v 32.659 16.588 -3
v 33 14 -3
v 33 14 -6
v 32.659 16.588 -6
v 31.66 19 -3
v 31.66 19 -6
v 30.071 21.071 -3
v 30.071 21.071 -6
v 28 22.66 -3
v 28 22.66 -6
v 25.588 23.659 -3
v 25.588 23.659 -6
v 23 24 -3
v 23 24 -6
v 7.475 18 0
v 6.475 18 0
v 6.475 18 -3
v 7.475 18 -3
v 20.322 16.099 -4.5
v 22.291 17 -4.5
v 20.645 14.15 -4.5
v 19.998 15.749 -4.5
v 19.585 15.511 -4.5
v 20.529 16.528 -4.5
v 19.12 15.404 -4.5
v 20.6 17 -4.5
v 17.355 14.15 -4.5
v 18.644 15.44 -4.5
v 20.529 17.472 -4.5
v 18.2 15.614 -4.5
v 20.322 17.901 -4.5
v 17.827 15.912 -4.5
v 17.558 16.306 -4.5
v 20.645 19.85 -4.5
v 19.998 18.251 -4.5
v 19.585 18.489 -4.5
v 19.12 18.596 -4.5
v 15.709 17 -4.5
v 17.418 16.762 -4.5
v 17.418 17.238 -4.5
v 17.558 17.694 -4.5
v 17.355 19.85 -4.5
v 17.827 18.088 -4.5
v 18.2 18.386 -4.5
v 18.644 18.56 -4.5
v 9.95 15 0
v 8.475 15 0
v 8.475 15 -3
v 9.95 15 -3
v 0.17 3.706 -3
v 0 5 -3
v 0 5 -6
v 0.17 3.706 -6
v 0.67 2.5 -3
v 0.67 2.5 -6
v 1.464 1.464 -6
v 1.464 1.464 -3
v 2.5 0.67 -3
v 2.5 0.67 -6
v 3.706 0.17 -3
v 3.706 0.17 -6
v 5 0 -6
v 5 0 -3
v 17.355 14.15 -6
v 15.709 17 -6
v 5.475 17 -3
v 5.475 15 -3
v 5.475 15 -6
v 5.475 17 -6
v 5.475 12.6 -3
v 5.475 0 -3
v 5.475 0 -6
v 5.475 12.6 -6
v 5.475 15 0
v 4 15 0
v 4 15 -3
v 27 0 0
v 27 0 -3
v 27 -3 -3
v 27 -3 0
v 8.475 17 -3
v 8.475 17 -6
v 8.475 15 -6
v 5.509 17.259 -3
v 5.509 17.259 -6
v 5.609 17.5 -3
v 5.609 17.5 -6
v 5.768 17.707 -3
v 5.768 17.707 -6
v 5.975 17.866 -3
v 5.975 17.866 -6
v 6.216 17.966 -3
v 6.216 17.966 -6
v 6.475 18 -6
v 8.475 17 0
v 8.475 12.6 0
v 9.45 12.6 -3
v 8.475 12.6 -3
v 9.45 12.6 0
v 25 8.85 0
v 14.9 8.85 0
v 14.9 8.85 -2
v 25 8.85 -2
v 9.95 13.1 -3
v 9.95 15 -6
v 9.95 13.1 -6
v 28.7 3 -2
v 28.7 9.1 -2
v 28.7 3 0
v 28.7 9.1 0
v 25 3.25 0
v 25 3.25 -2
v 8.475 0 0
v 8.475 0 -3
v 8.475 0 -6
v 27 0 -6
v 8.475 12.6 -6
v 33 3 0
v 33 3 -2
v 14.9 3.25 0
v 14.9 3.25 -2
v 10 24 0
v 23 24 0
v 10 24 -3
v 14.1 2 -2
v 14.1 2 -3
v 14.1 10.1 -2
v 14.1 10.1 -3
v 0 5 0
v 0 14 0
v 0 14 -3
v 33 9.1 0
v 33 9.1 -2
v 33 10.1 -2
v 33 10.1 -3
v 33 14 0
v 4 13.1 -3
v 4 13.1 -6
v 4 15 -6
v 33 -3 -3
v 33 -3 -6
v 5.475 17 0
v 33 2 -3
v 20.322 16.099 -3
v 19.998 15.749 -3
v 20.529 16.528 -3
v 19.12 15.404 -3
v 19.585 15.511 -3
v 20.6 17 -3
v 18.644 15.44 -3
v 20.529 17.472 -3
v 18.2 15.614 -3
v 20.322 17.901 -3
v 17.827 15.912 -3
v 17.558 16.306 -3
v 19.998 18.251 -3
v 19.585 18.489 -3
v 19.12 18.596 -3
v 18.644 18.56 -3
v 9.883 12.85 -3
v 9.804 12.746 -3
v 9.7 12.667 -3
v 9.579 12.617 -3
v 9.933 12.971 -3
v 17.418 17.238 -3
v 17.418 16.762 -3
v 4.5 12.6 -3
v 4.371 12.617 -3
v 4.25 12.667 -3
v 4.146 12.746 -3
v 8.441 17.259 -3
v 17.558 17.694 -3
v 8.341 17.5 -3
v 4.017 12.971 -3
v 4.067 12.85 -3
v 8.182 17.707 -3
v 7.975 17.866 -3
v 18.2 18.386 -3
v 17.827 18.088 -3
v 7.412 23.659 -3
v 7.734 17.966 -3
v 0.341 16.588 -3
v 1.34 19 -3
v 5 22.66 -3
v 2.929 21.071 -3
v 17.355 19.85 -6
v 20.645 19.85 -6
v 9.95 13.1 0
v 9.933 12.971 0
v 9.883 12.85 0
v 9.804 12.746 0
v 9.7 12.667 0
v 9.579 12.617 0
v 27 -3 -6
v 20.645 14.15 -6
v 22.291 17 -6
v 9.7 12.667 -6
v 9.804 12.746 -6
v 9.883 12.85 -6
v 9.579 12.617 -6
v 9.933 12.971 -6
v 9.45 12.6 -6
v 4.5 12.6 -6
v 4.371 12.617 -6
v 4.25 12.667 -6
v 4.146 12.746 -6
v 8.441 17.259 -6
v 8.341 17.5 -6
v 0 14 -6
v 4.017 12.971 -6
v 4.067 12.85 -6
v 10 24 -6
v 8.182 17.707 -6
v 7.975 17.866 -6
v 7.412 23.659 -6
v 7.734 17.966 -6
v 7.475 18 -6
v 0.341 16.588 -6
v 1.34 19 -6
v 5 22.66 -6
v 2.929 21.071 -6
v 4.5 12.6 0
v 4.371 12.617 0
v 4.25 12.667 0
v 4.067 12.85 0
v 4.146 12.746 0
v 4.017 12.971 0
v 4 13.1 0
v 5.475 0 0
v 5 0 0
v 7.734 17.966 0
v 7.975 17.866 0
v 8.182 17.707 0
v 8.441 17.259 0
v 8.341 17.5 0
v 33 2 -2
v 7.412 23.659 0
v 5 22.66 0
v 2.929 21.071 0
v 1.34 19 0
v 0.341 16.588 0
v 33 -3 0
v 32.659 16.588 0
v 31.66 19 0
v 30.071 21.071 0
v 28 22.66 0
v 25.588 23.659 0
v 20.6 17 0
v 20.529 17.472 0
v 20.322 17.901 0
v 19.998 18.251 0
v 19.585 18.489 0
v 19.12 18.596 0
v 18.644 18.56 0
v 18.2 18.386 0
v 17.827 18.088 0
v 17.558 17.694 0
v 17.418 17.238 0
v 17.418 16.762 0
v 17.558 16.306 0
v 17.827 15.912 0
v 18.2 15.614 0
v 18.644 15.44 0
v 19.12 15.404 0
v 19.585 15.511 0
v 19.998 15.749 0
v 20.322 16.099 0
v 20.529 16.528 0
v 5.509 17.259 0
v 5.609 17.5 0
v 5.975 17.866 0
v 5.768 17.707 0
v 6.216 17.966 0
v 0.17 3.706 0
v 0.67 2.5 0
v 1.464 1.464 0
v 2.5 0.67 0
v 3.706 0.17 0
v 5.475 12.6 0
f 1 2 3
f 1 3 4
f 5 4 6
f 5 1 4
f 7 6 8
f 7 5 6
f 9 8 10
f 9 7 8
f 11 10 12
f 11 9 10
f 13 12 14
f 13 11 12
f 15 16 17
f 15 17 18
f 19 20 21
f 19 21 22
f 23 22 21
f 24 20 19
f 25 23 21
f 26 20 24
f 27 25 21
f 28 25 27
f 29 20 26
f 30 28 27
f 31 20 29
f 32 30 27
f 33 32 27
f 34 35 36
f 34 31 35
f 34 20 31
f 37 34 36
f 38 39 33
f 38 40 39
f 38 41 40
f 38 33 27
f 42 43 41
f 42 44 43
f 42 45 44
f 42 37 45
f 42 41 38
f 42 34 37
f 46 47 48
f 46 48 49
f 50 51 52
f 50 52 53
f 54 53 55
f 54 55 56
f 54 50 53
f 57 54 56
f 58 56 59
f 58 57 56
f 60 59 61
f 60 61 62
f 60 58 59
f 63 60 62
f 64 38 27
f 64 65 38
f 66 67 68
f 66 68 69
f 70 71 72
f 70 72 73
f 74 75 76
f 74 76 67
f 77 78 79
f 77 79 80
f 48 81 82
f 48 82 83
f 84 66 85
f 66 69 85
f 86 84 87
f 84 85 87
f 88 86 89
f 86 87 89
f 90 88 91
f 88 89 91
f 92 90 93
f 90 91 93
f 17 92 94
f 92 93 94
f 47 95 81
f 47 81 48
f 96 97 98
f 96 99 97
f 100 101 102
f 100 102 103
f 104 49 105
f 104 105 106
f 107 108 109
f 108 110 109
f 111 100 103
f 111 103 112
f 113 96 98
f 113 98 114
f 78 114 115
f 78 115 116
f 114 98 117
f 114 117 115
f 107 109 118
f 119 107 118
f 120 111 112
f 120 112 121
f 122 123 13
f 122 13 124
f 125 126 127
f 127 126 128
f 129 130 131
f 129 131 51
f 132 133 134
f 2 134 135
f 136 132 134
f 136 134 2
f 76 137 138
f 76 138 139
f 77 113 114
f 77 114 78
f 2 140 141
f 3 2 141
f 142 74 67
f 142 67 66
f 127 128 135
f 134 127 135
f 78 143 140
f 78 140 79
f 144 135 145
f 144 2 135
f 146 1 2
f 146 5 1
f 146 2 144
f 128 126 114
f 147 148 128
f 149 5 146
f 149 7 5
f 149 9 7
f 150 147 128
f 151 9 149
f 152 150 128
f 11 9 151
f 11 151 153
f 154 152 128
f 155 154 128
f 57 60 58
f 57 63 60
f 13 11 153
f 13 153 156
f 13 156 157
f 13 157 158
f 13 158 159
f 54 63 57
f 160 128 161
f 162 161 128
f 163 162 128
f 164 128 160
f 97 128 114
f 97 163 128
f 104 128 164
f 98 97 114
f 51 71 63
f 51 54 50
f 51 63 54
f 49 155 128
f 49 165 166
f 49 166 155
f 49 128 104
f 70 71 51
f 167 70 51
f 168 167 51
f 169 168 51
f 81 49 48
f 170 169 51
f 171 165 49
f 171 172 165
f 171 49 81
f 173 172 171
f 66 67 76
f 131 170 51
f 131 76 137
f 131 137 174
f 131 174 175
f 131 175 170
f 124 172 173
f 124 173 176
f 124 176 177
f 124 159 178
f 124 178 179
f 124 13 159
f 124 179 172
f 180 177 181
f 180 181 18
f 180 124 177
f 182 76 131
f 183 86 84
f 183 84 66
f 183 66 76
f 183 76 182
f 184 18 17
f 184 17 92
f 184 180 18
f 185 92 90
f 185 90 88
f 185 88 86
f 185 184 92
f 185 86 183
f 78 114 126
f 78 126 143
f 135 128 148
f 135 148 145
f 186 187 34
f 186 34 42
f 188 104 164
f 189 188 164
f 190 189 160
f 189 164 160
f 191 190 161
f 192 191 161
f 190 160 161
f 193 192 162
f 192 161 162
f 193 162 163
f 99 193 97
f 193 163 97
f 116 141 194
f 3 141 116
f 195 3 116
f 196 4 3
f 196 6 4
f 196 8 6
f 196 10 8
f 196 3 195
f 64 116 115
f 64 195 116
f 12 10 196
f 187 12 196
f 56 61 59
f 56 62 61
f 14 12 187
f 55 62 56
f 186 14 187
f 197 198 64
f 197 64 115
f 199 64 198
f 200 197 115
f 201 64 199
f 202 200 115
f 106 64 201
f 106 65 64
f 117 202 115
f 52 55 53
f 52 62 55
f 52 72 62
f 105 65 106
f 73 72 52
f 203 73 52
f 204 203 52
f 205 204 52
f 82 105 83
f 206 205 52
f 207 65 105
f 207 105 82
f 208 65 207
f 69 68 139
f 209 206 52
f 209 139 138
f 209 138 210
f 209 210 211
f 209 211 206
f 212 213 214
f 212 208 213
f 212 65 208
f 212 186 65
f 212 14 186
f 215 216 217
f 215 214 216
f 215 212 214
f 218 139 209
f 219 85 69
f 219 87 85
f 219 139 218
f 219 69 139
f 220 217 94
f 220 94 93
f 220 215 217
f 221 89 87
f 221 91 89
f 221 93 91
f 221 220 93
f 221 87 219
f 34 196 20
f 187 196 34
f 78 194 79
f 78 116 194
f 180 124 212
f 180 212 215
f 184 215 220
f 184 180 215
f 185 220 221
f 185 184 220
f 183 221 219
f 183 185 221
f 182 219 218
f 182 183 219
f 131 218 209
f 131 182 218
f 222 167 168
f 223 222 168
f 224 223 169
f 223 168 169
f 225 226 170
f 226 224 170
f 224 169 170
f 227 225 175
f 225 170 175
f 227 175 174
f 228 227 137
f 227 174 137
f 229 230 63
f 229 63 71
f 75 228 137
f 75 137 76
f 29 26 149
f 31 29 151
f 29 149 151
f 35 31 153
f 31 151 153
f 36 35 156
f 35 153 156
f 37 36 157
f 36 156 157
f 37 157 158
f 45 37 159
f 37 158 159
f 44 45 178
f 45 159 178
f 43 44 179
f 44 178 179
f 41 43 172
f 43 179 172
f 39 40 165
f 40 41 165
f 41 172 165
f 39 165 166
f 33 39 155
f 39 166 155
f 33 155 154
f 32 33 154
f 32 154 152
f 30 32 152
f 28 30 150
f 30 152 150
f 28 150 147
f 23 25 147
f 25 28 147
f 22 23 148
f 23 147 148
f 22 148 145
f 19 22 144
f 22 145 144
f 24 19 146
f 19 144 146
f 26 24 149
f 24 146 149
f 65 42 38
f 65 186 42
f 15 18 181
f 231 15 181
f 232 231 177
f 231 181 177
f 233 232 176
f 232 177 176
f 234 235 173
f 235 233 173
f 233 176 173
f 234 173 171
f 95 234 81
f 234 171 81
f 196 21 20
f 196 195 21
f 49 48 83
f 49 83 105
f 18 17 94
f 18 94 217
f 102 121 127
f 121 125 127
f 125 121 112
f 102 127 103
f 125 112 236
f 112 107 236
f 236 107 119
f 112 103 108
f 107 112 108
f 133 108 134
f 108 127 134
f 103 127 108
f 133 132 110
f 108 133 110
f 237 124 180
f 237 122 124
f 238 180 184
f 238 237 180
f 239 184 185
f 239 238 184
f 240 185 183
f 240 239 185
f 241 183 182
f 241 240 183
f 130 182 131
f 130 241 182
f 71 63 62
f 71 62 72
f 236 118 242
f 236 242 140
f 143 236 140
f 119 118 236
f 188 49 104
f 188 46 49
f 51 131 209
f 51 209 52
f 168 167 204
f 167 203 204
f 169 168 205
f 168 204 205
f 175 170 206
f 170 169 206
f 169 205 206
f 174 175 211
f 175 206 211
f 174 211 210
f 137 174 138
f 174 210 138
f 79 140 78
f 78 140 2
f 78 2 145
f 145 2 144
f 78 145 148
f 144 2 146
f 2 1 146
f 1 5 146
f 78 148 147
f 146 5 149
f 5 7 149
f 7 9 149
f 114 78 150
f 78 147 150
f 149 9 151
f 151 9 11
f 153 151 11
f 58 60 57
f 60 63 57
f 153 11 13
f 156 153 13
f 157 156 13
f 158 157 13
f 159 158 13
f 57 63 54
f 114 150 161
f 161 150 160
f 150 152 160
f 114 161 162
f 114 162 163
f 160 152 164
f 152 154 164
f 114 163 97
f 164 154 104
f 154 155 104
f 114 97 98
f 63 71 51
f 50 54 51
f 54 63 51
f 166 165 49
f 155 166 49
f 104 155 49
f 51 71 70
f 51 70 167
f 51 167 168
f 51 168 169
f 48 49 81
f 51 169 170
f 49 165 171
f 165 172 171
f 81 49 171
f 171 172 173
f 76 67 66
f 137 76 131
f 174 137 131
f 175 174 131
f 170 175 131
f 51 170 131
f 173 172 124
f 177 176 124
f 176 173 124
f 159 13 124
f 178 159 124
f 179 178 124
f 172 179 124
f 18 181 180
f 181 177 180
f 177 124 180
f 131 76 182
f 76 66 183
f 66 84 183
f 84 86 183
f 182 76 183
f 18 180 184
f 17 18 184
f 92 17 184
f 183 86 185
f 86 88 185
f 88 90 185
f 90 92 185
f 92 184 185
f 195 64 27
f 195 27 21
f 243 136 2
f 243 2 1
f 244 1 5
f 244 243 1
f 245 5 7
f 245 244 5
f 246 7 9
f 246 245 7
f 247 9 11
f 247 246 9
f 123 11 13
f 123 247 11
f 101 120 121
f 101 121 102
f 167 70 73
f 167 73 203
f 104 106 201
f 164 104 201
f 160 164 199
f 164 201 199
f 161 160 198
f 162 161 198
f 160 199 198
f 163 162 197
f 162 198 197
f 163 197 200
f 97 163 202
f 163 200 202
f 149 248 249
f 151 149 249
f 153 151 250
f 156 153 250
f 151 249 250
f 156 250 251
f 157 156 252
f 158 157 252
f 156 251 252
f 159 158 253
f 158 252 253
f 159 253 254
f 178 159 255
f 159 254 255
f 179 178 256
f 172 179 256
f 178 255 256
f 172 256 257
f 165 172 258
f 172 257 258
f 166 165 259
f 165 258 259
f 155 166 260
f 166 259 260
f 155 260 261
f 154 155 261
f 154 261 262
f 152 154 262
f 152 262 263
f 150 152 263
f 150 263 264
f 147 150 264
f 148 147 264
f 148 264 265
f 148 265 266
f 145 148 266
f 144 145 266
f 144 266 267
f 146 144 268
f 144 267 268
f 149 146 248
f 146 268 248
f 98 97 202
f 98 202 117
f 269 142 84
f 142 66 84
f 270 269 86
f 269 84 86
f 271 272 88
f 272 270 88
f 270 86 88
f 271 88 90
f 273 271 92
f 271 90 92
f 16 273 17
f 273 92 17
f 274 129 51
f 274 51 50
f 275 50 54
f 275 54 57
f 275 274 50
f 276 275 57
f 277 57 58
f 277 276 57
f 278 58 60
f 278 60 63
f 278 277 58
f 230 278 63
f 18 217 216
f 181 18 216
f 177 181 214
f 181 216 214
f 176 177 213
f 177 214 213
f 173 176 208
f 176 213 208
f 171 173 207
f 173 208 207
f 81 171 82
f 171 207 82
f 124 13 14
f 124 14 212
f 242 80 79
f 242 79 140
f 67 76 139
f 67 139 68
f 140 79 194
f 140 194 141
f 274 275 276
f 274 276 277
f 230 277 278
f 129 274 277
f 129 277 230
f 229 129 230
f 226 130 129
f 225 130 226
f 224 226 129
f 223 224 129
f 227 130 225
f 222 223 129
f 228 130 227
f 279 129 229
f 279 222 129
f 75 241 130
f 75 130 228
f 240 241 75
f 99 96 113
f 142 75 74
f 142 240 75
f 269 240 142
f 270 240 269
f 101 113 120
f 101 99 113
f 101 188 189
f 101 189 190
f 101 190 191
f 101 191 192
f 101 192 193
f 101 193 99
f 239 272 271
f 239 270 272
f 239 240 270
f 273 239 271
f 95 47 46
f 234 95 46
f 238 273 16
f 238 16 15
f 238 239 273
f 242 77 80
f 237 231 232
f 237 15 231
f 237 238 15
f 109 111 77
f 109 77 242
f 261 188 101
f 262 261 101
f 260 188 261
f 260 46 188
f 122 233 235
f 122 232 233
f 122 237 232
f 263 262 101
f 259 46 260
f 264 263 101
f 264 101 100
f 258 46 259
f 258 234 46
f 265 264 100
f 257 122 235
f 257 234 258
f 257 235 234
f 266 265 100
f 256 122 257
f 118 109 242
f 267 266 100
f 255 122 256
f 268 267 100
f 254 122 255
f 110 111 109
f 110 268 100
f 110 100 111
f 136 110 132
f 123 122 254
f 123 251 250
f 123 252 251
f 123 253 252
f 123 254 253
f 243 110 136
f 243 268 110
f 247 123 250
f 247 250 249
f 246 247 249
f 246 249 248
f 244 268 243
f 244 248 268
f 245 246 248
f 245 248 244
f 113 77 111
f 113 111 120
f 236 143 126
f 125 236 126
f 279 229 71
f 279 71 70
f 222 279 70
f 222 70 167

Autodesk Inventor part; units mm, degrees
ref_plane "YZ Plane" through (0, 0, 0) normal (1, 0, 0) x (0, 1, 0)
ref_plane "XZ Plane" through (0, 0, 0) normal (0, 1, 0) x (-1, 0, 0)
ref_plane "XY Plane" through (0, 0, 0) normal (0, 0, 1) x (1, 0, 0)
sketch "Sketch1" plane through (0, 0, 0) normal (0, 0, 1) x (1, 0, 0)
  line L0 (5, 0) -> (5.475, 0)
  line L1 (33, 0) -> (33, 14)
  line L2 (23, 24) -> (10, 24)
  line L3 (0, 14) -> (0, 5)
  line L4 (5.475, 0) -> (5.475, 12.6)
  line L5 (5.475, 12.6) -> (4, 12.6)
  line L6 (4, 12.6) -> (4, 15)
  line L7 (4, 15) -> (5.475, 15)
  line L8 (5.475, 15) -> (5.475, 18)
  line L9 (5.475, 18) -> (8.475, 18)
  line L10 (8.475, 18) -> (8.475, 15)
  line L11 (8.475, 15) -> (9.95, 15)
  line L12 (9.95, 15) -> (9.95, 12.6)
  line L13 (9.95, 12.6) -> (8.475, 12.6)
  line L14 (8.475, 12.6) -> (8.475, 0)
  circle A0 centre (19, 17) radius 1.6
  line L15 (5.475, 0) -> (8.475, 0) construction
  line L16 (8.475, 0) -> (33, 0)
  line L17 (33, 2) -> (14.1, 2)
  line L18 (14.1, 2) -> (14.1, 6.05)
  line L19 (14.1, 10.1) -> (33, 10.1)
  line L20 (33, 10.1) -> (33, 2)
  line L21 (33, 9.1) -> (28.7, 9.1)
  line L22 (28.7, 9.1) -> (28.7, 6.05)
  line L23 (28.7, 3) -> (33, 3)
  line L24 (33, 3) -> (33, 9.1)
  line L25 (14.9, 8.85) -> (25, 8.85)
  line L26 (25, 8.85) -> (25, 3.25)
  line L27 (25, 3.25) -> (14.9, 3.25)
  line L28 (14.9, 3.25) -> (14.9, 6.05)
  line L29 (14.1, 6.05) -> (33, 6.05) construction
  line L30 (14.9, 6.05) -> (14.9, 8.85)
  line L31 (28.7, 6.05) -> (28.7, 3)
  line L32 (14.1, 6.05) -> (14.1, 10.1)
  arc A1 (10, 24) -> (0, 14) centre (10, 14) ccw
  arc A2 (33, 14) -> (23, 24) centre (23, 14) ccw
  arc A3 (0, 5) -> (5, 0) centre (5, 5) ccw
  point P0 (0, 0)
  point P1 (33, 24)
  point P2 (0, 24)
  dimension "totalWidth" = 33
  dimension "totalHeight" = 24
  dimension "edgeToNut" = 4
  dimension "boltHoleWidth" = 3
  dimension "nutSlotEndOffset" = 3
  dimension "boltHoleLength" = 18
  dimension "nutSlotDepth" = 2.4
  dimension "nutSlotWidth" = 5.95
  dimension "boltVertOffset" = 7
  dimension "boltDiameter" = 3.2
  dimension "boltHorizOffset" = 14
  dimension "IRSensorLength" = 18.9
  dimension "IRSensorHeight" = 8.1
  dimension "IRSensorVertOffset" = 2
  dimension "IRModuleHeight" = 5.6
  dimension "IRModuleLength" = 10.1
  dimension "moduleConnectorGap" = 3.7
  dimension "connectorHeight" = 6.1
  dimension "connectorWidth" = 4.3
  dimension "topFillet" = 10
  dimension "d20" = 10
  dimension "d21" = 5
extrude "Extrusion1" add sketch "Sketch1" against normal blind 3 contours A3 L3 A1 L2 A2 L1 L19 L32 L18 L17 L16 L14 L13 L12 L11 L10 L9 L8 L7 L6 L5 L4 L0 | L1 L21 L22 L31 L23 L17 L18 L32 L19
fillet "Fillet1" radius 1 2 edges at (5.475, 18, -1.5) (8.475, 18, -1.5)
fillet "Fillet2" radius 0.5 2 edges at (4, 12.6, -1.5) (9.95, 12.6, -1.5)
extrude "Extrusion2" add sketch "Sketch1" against normal blind 3 from surface at -3 separate body contours A3 L3 A1 L2 A2 L1 L19 L32 L18 L17 L16 L14 L13 L12 L11 L10 L9 L8 L7 L6 L5 L4 L0 | L1 L21 L22 L31 L23 L17 L18 L32 L19 | L1 L23 L31 L22 L21 | L25 L26 L27 L28 L30
sketch "Sketch2" plane through (33, 0, -6) normal (0, 0, -1) x (-1, 0, 0)
  circle A0 centre (14, 17) radius 1.6 projected
  line L0 (15.6454, 19.85) -> (17.2909, 17)
  line L1 (17.2909, 17) -> (15.6454, 14.15)
  line L2 (15.6454, 14.15) -> (12.3546, 14.15)
  line L3 (12.3546, 14.15) -> (10.7091, 17)
  line L4 (10.7091, 17) -> (12.3546, 19.85)
  line L5 (12.3546, 19.85) -> (15.6454, 19.85)
  line L6 (23, 24) -> (10, 24) projected
  point P0 (33, 0)
  dimension "nutSlotDiameter" = 5.7
extrude "Extrusion3" cut sketch "Sketch2" against normal blind 1.5 bodies 2
sketch "Sketch3" plane through (8.475, 0, 0) normal (0, -1, 0) x (1, 0, 0)
  line L0 (24.525, -6) -> (0, -6) projected
  line L1 (24.525, -6) -> (18.525, -6)
  line L2 (18.525, -6) -> (18.525, 0)
  line L3 (18.525, 0) -> (24.525, 0)
  line L4 (24.525, 0) -> (24.525, -6)
  line L5 (24.525, -6) -> (24.525, -3) projected
  line L6 (24.525, -3) -> (18.525, -3)
  line L7 (24.525, -3) -> (0, -3) projected
  point P0 (-8.475, 0)
  dimension "d31" = 6
  dimension "d32" = 6
extrude "Extrusion4" add sketch "Sketch3" along normal blind 3 contours L6 L2 L3 L4 bodies 1
extrude "Extrusion5" add sketch "Sketch3" along normal blind 3 contours L0 L2 L6 L4 bodies 2
sketch "Sketch4" plane through (10, 24, -3) normal (0, 0, 1) x (1, 0, 0)
  line L0 (4.1, -13.9) -> (23, -13.9) projected
  line L1 (23, -13.9) -> (23, -22) projected
  line L2 (23, -22) -> (4.1, -22) projected
  line L3 (4.1, -22) -> (4.1, -17.95) projected
  line L4 (4.1, -17.95) -> (4.1, -13.9) projected
  point P0 (-10, -24)
extrude "Extrusion6" cut sketch "Sketch4" along normal blind 1 bodies 1
fillet "Fillet3" radius 1 2 edges at (5.475, 18, -4.5) (8.475, 18, -4.5)
fillet "Fillet4" radius 0.5 2 edges at (9.95, 12.6, -4.5) (4, 12.6, -4.5)
equation "\"d20\" = topFillet"
equation "\"d21\" = 0.5 * topFillet"
equation "\"d29\" = 0.5 * perspexThickness"
equation "\"d31\" = 2 * perspexThickness"
equation "\"d32\" = 2 * perspexThickness"
equation "\"d33\" = perspexThickness"
equation "\"d35\" = perspexThickness"
equation "\"perspexThickness\" = 3"
properties part number "Front"
